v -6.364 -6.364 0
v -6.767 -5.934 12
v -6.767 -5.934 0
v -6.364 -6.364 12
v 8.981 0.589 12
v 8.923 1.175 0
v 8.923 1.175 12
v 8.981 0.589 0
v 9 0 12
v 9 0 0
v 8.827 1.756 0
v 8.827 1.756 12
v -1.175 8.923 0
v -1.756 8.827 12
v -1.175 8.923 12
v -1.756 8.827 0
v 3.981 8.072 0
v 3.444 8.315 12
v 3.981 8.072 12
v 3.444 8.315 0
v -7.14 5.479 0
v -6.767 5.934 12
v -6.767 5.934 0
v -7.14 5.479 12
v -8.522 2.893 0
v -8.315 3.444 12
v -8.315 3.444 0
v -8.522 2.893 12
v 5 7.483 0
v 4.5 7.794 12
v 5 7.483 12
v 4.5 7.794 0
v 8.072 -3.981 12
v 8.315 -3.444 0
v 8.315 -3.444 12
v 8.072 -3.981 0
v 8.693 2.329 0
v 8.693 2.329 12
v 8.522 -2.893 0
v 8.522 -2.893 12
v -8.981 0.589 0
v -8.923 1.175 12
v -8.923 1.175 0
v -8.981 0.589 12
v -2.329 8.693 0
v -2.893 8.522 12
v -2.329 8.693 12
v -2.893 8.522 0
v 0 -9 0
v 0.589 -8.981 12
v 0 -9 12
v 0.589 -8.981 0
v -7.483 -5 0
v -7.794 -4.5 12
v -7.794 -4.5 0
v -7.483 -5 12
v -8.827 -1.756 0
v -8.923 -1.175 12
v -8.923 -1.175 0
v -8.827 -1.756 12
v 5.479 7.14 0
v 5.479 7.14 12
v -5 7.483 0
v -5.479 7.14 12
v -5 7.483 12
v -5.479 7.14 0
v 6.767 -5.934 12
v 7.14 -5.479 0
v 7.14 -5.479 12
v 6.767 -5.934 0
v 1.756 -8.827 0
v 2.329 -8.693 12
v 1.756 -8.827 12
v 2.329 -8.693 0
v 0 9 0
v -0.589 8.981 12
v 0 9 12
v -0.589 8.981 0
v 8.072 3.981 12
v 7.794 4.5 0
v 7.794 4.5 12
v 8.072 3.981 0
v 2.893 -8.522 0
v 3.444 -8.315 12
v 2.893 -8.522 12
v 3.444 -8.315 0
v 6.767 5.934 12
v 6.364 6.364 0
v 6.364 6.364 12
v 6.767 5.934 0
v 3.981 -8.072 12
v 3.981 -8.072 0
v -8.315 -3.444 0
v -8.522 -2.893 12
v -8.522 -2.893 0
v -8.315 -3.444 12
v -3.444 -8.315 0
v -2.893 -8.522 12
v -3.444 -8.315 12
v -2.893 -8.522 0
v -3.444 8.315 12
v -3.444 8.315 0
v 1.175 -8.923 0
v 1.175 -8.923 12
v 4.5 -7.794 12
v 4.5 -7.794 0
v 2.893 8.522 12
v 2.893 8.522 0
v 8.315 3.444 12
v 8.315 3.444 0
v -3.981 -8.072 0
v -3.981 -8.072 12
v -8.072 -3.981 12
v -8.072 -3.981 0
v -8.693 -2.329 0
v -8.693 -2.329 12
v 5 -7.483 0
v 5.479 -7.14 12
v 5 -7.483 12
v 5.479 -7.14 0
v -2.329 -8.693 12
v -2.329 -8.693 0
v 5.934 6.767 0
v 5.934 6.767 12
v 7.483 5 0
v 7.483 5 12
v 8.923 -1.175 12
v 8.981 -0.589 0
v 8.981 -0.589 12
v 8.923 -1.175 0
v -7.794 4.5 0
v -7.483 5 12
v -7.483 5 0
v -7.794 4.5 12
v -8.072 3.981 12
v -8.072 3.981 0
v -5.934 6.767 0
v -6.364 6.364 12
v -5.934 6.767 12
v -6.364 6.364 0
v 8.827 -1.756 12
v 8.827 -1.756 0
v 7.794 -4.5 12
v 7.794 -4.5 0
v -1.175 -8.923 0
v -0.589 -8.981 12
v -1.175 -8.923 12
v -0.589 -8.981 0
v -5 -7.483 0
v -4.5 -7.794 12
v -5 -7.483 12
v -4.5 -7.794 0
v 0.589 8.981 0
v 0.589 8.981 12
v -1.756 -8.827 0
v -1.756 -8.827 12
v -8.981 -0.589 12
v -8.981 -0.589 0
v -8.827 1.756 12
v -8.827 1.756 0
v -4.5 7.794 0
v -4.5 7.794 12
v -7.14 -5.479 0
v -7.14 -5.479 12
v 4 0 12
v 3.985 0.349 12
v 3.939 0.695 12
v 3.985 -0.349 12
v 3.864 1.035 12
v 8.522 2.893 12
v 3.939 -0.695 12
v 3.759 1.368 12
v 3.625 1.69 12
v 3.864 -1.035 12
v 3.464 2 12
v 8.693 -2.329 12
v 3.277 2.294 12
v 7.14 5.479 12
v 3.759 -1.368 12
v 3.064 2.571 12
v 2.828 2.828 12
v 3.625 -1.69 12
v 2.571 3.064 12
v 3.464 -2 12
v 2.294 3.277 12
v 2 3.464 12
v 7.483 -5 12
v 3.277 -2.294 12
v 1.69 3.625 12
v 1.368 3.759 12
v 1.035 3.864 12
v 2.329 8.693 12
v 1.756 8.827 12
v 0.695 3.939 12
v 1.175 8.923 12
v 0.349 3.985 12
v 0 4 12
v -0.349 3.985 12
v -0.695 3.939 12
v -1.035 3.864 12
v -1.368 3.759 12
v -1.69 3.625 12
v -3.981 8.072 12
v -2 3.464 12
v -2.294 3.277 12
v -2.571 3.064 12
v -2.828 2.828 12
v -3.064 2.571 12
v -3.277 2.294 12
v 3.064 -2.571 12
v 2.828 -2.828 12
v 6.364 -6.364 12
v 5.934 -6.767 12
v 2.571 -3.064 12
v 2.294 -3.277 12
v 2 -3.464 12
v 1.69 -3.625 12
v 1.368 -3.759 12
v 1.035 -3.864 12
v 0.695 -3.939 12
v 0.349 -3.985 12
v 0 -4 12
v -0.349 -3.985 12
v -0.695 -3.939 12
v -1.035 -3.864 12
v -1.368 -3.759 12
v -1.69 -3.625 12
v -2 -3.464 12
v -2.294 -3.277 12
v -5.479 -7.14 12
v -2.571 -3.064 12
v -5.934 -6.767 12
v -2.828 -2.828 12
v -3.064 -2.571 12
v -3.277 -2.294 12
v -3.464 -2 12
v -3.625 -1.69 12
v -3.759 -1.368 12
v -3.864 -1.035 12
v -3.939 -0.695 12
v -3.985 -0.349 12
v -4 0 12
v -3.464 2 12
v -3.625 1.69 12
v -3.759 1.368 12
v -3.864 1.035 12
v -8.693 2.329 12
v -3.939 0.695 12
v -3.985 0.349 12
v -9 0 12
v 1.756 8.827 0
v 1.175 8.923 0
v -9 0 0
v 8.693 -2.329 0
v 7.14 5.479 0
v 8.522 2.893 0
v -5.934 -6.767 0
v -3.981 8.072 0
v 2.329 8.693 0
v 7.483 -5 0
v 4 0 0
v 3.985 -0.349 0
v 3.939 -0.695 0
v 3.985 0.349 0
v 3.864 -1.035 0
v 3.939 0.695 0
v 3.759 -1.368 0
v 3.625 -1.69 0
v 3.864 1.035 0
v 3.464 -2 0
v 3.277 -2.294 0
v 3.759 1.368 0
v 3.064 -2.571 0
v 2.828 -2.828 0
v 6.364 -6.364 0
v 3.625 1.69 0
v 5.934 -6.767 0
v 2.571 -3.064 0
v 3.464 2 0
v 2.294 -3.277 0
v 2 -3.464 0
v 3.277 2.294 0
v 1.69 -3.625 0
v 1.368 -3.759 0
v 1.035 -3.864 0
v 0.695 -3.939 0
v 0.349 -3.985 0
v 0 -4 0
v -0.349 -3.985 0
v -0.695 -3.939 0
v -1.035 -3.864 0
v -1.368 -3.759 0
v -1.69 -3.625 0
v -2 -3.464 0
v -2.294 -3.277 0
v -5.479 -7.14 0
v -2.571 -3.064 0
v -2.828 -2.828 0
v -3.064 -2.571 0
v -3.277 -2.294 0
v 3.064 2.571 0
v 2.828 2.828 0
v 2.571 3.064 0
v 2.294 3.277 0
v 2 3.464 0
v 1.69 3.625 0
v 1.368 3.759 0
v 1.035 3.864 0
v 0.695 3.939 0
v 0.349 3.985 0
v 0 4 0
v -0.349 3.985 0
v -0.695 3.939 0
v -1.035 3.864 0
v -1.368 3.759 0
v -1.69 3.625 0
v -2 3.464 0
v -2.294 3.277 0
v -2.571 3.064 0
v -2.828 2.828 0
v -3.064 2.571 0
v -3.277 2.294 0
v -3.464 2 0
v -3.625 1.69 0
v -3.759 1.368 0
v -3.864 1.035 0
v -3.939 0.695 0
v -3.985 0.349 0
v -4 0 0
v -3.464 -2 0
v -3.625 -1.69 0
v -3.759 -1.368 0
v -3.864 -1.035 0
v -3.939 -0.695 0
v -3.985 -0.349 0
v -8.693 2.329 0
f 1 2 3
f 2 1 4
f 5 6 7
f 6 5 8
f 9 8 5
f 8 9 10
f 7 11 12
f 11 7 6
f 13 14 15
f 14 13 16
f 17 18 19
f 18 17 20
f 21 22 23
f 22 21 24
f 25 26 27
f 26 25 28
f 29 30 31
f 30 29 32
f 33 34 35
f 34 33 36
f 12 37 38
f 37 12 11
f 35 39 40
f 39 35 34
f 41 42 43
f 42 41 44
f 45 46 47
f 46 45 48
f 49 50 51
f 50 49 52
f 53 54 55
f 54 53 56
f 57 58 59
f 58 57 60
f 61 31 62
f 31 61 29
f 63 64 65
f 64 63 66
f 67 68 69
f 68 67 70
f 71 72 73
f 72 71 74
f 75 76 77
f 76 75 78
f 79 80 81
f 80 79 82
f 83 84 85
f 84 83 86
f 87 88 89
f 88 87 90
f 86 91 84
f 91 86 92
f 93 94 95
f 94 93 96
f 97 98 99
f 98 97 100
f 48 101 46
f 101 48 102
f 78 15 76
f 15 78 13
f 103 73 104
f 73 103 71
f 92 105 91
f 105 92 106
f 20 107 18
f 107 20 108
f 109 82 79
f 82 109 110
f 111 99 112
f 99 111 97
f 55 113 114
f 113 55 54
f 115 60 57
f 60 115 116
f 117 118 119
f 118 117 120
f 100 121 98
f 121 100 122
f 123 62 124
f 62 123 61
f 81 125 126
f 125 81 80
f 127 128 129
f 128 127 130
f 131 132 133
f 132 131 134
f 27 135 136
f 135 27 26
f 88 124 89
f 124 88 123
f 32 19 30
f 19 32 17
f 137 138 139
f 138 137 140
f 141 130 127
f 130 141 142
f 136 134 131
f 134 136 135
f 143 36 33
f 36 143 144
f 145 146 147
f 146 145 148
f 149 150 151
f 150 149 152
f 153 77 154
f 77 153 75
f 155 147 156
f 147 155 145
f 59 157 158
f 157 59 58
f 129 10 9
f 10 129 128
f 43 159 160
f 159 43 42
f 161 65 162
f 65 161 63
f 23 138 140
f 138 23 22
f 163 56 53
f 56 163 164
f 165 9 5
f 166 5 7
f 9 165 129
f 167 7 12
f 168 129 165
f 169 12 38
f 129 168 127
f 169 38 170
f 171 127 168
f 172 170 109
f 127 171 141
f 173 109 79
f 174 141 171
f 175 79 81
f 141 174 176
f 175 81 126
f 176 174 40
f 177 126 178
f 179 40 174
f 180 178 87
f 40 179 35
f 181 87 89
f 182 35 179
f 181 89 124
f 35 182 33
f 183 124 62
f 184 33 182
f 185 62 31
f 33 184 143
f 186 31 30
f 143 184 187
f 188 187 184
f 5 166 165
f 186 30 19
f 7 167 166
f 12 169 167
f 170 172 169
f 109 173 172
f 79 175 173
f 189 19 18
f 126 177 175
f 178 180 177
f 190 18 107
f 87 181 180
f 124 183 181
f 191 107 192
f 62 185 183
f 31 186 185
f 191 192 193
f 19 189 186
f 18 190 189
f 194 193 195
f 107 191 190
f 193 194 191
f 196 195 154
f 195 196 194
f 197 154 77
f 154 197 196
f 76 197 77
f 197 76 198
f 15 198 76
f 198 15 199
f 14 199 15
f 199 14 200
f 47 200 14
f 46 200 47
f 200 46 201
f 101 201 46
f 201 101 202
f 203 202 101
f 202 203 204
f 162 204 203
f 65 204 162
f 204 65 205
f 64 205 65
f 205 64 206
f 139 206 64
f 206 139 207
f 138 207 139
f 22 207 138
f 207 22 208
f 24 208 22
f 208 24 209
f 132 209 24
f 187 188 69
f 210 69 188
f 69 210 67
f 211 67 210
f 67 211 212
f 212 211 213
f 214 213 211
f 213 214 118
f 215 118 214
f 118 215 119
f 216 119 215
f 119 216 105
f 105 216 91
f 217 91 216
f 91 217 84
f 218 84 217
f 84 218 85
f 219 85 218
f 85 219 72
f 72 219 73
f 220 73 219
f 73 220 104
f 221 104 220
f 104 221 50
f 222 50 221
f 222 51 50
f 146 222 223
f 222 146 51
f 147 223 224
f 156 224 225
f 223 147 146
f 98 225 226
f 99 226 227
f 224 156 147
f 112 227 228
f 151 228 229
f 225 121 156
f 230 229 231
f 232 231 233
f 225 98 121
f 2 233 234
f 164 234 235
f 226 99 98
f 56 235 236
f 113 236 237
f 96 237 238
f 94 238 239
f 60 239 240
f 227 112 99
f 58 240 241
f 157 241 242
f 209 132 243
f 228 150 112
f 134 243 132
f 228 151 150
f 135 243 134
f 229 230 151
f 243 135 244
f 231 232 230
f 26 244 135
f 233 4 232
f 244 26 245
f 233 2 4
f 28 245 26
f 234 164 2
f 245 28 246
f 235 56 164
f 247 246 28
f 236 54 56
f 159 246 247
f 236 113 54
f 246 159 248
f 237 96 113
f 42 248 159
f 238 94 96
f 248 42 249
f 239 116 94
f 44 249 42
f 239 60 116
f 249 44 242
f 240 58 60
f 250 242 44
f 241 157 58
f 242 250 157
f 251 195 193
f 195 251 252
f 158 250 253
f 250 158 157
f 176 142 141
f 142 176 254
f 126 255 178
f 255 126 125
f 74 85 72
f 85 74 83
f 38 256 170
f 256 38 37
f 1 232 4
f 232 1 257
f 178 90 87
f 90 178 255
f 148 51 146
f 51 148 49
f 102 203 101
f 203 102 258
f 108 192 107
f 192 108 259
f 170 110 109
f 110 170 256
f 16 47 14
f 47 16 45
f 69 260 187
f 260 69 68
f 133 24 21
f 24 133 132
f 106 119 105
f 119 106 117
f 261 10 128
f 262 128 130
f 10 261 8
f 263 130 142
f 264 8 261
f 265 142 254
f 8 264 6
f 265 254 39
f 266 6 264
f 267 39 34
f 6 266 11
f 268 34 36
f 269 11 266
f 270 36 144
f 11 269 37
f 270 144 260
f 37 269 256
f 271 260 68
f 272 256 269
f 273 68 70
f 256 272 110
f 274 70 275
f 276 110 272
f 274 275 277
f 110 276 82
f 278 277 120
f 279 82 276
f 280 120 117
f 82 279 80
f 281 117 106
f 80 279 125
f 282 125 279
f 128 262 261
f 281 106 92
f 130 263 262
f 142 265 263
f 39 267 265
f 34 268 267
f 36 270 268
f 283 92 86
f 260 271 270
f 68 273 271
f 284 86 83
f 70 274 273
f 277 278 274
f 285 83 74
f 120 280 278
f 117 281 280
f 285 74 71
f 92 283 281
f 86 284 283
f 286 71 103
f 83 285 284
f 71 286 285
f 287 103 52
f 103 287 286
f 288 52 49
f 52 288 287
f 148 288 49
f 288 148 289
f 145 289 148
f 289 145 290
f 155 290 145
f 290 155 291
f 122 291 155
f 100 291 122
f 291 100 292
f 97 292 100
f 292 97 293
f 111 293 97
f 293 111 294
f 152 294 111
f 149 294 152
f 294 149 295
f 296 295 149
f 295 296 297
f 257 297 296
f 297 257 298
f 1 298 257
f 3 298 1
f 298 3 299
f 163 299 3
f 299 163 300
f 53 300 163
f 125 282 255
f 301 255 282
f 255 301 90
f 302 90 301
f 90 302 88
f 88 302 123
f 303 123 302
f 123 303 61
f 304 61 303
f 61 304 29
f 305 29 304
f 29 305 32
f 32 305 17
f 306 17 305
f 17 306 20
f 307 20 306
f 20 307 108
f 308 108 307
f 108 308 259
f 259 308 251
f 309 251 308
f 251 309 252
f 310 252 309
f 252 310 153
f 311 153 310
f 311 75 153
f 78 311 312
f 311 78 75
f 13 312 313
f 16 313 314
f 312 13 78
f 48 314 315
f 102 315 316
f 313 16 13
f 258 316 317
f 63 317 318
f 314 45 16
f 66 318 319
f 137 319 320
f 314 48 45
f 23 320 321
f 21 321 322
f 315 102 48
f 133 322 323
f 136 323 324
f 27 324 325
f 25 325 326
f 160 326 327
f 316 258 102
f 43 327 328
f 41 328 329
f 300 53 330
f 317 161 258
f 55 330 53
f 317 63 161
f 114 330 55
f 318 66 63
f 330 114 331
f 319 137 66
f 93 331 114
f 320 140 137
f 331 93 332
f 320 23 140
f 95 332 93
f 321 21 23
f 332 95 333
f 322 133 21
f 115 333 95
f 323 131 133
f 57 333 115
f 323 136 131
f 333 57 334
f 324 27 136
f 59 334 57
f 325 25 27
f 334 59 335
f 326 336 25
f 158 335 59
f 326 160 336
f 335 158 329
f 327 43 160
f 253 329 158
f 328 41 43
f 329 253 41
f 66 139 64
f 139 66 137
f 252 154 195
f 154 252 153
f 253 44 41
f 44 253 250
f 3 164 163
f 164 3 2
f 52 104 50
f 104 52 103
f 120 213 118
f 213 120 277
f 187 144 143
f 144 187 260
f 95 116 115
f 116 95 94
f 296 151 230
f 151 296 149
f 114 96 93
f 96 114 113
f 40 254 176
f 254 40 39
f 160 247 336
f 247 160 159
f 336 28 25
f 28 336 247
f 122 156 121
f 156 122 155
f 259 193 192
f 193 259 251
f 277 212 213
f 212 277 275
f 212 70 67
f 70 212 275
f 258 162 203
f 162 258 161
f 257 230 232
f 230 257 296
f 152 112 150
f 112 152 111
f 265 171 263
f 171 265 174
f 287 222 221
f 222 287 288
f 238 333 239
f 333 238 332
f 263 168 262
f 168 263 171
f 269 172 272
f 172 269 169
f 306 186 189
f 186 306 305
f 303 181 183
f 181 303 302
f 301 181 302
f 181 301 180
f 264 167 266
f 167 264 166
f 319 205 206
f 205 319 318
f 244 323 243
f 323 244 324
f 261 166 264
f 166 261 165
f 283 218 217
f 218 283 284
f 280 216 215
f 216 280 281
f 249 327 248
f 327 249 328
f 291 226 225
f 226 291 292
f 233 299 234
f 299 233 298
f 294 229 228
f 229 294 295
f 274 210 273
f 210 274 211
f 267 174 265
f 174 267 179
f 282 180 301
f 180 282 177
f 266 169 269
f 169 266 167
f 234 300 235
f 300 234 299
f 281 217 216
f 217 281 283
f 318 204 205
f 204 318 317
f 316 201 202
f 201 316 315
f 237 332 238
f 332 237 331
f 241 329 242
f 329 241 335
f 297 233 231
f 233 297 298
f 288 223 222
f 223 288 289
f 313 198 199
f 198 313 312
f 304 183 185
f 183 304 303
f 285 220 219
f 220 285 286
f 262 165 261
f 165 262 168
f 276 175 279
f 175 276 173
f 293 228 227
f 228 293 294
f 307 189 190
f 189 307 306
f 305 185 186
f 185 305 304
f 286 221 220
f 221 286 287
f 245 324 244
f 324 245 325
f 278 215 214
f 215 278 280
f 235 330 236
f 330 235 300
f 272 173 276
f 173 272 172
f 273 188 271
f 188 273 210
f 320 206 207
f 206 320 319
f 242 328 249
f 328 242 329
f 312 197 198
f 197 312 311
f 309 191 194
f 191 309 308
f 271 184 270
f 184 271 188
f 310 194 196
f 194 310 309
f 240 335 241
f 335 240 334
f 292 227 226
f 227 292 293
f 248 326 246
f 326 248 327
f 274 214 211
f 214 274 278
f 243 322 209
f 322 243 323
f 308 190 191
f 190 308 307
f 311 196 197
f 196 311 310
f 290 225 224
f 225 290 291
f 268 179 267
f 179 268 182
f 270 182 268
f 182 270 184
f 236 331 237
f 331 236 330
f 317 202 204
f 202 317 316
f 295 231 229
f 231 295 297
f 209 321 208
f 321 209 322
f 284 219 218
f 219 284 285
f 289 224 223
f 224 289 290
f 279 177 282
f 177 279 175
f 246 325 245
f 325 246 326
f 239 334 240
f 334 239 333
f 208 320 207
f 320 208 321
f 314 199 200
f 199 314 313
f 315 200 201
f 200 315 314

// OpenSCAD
module axle_spacer(outer_d=18, inner_d=8, length=12, chamfer=0.5) {
difference() {
// Main body
cylinder(h=length, d=outer_d, $fn=96);

// Through bore
translate([0,0,-0.1])
cylinder(h=length+0.2, d=inner_d, $fn=72);
}

// Optional manual refinement later:
// Add small chamfers or fillets at both ends if desired.
}

axle_spacer();
